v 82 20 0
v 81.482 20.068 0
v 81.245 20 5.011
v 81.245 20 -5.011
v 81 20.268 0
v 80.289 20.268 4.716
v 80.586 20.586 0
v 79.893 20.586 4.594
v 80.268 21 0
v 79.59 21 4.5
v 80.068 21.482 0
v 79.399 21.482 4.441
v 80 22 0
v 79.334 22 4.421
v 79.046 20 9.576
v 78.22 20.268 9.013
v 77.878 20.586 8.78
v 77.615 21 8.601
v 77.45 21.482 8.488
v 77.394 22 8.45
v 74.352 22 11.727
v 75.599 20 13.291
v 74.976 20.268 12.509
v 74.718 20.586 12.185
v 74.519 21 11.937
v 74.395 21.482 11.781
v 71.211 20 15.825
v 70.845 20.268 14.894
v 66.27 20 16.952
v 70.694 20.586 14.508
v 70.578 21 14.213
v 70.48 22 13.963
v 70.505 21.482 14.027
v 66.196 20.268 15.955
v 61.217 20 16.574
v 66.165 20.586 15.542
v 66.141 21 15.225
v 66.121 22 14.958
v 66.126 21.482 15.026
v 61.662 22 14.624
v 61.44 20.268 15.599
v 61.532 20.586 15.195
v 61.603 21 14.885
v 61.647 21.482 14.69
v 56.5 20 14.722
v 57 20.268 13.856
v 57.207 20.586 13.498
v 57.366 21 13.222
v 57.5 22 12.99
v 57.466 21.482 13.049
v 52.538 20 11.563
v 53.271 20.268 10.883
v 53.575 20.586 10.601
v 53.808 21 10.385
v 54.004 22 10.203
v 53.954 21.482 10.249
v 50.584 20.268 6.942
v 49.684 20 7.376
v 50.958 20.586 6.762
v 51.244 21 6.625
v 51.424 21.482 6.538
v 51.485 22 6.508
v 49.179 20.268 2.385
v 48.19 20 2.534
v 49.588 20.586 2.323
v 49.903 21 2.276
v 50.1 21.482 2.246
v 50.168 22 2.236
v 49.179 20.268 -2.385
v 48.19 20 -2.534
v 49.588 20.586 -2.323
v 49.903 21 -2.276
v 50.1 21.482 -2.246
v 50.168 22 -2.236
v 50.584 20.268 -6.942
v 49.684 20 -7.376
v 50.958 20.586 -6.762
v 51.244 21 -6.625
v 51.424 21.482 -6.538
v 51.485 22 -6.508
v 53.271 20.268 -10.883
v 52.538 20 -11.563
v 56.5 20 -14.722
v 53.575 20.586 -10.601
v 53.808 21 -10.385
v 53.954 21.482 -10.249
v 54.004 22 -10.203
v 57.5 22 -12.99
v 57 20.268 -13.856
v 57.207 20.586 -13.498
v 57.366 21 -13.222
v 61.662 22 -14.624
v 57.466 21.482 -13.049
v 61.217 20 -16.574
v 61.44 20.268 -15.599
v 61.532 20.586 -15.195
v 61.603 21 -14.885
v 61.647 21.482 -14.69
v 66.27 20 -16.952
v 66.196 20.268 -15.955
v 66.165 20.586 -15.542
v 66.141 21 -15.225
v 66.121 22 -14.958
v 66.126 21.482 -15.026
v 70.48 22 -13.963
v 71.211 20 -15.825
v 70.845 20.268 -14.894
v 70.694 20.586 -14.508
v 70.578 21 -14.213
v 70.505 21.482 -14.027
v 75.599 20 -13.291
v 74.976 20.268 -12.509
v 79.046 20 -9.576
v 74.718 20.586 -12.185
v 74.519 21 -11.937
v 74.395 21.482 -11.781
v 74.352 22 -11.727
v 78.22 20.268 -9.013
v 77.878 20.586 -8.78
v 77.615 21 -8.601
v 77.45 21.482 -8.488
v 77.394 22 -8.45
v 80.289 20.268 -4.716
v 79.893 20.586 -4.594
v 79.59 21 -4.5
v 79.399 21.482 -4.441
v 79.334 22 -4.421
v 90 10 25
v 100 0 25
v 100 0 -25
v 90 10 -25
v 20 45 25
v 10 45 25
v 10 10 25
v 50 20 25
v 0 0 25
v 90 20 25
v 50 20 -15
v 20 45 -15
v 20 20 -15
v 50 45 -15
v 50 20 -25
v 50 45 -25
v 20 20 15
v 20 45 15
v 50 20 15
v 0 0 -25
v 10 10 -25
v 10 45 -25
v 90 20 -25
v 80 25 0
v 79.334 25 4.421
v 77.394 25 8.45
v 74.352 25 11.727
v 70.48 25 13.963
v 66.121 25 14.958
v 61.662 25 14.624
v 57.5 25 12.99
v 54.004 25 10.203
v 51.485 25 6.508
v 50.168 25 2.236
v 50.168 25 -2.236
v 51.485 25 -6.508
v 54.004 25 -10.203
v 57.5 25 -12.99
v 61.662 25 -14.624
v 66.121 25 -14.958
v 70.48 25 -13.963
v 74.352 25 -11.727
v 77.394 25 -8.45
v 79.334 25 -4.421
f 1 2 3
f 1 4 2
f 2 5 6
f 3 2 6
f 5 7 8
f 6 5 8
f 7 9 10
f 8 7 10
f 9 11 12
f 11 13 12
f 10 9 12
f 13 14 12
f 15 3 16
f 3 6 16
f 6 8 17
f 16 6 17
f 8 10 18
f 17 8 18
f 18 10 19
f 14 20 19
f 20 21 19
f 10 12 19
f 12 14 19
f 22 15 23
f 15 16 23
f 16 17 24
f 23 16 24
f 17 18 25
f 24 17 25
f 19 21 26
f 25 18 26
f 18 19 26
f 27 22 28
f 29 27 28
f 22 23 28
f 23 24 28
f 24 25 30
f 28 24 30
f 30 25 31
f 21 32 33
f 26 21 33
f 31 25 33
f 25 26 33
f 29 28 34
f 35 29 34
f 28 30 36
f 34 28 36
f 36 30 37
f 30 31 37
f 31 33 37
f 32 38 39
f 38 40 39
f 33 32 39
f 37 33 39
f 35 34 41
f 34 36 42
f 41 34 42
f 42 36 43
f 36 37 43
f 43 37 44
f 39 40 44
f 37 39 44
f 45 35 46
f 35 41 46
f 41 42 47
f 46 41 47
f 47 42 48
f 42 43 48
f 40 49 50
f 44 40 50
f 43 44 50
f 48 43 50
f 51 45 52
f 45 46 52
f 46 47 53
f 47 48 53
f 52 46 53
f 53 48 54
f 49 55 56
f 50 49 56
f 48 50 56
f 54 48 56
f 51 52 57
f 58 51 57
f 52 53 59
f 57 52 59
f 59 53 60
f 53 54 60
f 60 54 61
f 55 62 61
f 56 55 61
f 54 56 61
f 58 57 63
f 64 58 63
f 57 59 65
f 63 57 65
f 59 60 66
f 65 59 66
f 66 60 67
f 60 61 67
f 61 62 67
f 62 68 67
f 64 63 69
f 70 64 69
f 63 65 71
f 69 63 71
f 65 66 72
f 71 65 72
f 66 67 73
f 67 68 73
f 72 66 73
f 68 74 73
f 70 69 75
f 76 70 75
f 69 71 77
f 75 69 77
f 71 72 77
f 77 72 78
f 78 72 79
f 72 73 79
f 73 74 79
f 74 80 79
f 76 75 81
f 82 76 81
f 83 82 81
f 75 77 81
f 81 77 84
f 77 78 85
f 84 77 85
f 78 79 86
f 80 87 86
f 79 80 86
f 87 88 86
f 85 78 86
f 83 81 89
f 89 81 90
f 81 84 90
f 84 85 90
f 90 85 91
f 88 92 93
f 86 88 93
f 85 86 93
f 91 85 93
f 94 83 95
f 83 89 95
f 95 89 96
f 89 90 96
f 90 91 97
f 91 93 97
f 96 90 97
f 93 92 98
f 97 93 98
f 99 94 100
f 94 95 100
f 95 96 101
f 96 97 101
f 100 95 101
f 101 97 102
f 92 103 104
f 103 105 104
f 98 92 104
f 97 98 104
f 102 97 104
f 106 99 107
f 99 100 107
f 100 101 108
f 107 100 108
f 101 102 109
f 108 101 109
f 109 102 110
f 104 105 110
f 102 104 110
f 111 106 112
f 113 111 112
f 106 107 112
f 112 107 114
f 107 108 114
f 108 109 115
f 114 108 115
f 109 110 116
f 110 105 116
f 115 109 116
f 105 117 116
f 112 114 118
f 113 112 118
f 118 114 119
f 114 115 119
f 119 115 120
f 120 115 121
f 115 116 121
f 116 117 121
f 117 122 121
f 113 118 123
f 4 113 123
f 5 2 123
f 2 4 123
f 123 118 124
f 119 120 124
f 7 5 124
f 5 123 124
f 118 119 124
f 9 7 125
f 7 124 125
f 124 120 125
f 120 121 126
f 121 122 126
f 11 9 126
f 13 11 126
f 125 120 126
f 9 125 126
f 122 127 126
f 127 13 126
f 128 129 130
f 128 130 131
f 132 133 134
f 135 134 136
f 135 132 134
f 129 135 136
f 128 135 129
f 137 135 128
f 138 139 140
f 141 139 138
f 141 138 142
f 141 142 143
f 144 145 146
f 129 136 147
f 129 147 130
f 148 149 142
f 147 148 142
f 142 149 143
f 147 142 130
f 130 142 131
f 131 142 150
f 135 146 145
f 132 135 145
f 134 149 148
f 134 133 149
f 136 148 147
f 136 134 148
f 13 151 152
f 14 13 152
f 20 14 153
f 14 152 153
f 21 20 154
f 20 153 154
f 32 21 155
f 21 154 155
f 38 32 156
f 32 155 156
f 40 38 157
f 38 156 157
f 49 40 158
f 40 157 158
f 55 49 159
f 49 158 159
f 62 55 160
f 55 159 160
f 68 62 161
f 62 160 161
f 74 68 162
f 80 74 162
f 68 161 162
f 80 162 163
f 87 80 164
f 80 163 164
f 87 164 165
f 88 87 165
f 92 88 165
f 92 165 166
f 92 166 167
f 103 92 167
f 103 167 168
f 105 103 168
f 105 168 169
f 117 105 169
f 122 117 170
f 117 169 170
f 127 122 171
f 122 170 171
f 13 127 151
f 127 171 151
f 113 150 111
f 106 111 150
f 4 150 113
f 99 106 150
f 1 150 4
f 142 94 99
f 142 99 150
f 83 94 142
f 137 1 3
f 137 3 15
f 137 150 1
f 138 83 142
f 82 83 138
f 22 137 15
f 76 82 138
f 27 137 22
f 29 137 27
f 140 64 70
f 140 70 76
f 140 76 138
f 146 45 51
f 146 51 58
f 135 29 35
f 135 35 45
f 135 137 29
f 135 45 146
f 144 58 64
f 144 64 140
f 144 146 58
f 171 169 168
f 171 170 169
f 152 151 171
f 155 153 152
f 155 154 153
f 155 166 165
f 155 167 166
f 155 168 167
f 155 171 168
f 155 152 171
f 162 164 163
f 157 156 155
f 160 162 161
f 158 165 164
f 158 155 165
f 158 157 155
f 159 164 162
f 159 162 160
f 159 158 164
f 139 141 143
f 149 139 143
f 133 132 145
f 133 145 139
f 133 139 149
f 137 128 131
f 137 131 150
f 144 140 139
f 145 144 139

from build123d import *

# Parameters (mm, degrees)
BOSS_EXTRU_1_DEPTH = 25
BOSS_EXTRU_4_START = 15
BOSS_EXTRU_4_DEPTH = 10
BOSS_EXTRU_5_START = -15
BOSS_EXTRU_5_DEPTH = 10
ESQUISSE1_9_W      = 15
ESQUISSE1_9_H      = 5
CONG_1_R           = 2


with BuildPart() as part:
    # Esquisse1 → Boss.-Extru.1 (new body, symmetric)
    with BuildSketch(Plane.XY):
        Polygon((10, 10), (0, 0), (100, 0), (90, 10), (90, 20), (20, 20), (20, 45), (10, 45), align=None)
    extrude(amount=BOSS_EXTRU_1_DEPTH, both=True)

    # Esquisse1_5 → Boss.-Extru.4 (add)
    with BuildSketch(Plane.XY.offset(BOSS_EXTRU_4_START)):
        Polygon((20, 45), (20, 20), (50, 20), align=None)
    extrude(amount=BOSS_EXTRU_4_DEPTH)

    # Esquisse1_6 → Boss.-Extru.5 (add)
    with BuildSketch(Plane.XY.offset(BOSS_EXTRU_5_START)):
        Polygon((20, 45), (20, 20), (50, 20), align=None)
        Polygon((50, 45), (20, 45), (50, 20), align=None)
    extrude(amount=-BOSS_EXTRU_5_DEPTH)

    # Esquisse1_9 → R_volution1 (revolve)
    with BuildSketch(Plane.XY):
        with Locations((72.5, 22.5)):
            Rectangle(ESQUISSE1_9_W, ESQUISSE1_9_H)
    revolve(axis=Axis((65, 46.334519573, 0), (0, -1, 0)))

    # Cong_1
    cong_1_edges = [part.edges().sort_by_distance(p)[0] for p in [
        (50, 20, 0),
    ]]
    fillet(cong_1_edges, radius=CONG_1_R)


solid = part.part
